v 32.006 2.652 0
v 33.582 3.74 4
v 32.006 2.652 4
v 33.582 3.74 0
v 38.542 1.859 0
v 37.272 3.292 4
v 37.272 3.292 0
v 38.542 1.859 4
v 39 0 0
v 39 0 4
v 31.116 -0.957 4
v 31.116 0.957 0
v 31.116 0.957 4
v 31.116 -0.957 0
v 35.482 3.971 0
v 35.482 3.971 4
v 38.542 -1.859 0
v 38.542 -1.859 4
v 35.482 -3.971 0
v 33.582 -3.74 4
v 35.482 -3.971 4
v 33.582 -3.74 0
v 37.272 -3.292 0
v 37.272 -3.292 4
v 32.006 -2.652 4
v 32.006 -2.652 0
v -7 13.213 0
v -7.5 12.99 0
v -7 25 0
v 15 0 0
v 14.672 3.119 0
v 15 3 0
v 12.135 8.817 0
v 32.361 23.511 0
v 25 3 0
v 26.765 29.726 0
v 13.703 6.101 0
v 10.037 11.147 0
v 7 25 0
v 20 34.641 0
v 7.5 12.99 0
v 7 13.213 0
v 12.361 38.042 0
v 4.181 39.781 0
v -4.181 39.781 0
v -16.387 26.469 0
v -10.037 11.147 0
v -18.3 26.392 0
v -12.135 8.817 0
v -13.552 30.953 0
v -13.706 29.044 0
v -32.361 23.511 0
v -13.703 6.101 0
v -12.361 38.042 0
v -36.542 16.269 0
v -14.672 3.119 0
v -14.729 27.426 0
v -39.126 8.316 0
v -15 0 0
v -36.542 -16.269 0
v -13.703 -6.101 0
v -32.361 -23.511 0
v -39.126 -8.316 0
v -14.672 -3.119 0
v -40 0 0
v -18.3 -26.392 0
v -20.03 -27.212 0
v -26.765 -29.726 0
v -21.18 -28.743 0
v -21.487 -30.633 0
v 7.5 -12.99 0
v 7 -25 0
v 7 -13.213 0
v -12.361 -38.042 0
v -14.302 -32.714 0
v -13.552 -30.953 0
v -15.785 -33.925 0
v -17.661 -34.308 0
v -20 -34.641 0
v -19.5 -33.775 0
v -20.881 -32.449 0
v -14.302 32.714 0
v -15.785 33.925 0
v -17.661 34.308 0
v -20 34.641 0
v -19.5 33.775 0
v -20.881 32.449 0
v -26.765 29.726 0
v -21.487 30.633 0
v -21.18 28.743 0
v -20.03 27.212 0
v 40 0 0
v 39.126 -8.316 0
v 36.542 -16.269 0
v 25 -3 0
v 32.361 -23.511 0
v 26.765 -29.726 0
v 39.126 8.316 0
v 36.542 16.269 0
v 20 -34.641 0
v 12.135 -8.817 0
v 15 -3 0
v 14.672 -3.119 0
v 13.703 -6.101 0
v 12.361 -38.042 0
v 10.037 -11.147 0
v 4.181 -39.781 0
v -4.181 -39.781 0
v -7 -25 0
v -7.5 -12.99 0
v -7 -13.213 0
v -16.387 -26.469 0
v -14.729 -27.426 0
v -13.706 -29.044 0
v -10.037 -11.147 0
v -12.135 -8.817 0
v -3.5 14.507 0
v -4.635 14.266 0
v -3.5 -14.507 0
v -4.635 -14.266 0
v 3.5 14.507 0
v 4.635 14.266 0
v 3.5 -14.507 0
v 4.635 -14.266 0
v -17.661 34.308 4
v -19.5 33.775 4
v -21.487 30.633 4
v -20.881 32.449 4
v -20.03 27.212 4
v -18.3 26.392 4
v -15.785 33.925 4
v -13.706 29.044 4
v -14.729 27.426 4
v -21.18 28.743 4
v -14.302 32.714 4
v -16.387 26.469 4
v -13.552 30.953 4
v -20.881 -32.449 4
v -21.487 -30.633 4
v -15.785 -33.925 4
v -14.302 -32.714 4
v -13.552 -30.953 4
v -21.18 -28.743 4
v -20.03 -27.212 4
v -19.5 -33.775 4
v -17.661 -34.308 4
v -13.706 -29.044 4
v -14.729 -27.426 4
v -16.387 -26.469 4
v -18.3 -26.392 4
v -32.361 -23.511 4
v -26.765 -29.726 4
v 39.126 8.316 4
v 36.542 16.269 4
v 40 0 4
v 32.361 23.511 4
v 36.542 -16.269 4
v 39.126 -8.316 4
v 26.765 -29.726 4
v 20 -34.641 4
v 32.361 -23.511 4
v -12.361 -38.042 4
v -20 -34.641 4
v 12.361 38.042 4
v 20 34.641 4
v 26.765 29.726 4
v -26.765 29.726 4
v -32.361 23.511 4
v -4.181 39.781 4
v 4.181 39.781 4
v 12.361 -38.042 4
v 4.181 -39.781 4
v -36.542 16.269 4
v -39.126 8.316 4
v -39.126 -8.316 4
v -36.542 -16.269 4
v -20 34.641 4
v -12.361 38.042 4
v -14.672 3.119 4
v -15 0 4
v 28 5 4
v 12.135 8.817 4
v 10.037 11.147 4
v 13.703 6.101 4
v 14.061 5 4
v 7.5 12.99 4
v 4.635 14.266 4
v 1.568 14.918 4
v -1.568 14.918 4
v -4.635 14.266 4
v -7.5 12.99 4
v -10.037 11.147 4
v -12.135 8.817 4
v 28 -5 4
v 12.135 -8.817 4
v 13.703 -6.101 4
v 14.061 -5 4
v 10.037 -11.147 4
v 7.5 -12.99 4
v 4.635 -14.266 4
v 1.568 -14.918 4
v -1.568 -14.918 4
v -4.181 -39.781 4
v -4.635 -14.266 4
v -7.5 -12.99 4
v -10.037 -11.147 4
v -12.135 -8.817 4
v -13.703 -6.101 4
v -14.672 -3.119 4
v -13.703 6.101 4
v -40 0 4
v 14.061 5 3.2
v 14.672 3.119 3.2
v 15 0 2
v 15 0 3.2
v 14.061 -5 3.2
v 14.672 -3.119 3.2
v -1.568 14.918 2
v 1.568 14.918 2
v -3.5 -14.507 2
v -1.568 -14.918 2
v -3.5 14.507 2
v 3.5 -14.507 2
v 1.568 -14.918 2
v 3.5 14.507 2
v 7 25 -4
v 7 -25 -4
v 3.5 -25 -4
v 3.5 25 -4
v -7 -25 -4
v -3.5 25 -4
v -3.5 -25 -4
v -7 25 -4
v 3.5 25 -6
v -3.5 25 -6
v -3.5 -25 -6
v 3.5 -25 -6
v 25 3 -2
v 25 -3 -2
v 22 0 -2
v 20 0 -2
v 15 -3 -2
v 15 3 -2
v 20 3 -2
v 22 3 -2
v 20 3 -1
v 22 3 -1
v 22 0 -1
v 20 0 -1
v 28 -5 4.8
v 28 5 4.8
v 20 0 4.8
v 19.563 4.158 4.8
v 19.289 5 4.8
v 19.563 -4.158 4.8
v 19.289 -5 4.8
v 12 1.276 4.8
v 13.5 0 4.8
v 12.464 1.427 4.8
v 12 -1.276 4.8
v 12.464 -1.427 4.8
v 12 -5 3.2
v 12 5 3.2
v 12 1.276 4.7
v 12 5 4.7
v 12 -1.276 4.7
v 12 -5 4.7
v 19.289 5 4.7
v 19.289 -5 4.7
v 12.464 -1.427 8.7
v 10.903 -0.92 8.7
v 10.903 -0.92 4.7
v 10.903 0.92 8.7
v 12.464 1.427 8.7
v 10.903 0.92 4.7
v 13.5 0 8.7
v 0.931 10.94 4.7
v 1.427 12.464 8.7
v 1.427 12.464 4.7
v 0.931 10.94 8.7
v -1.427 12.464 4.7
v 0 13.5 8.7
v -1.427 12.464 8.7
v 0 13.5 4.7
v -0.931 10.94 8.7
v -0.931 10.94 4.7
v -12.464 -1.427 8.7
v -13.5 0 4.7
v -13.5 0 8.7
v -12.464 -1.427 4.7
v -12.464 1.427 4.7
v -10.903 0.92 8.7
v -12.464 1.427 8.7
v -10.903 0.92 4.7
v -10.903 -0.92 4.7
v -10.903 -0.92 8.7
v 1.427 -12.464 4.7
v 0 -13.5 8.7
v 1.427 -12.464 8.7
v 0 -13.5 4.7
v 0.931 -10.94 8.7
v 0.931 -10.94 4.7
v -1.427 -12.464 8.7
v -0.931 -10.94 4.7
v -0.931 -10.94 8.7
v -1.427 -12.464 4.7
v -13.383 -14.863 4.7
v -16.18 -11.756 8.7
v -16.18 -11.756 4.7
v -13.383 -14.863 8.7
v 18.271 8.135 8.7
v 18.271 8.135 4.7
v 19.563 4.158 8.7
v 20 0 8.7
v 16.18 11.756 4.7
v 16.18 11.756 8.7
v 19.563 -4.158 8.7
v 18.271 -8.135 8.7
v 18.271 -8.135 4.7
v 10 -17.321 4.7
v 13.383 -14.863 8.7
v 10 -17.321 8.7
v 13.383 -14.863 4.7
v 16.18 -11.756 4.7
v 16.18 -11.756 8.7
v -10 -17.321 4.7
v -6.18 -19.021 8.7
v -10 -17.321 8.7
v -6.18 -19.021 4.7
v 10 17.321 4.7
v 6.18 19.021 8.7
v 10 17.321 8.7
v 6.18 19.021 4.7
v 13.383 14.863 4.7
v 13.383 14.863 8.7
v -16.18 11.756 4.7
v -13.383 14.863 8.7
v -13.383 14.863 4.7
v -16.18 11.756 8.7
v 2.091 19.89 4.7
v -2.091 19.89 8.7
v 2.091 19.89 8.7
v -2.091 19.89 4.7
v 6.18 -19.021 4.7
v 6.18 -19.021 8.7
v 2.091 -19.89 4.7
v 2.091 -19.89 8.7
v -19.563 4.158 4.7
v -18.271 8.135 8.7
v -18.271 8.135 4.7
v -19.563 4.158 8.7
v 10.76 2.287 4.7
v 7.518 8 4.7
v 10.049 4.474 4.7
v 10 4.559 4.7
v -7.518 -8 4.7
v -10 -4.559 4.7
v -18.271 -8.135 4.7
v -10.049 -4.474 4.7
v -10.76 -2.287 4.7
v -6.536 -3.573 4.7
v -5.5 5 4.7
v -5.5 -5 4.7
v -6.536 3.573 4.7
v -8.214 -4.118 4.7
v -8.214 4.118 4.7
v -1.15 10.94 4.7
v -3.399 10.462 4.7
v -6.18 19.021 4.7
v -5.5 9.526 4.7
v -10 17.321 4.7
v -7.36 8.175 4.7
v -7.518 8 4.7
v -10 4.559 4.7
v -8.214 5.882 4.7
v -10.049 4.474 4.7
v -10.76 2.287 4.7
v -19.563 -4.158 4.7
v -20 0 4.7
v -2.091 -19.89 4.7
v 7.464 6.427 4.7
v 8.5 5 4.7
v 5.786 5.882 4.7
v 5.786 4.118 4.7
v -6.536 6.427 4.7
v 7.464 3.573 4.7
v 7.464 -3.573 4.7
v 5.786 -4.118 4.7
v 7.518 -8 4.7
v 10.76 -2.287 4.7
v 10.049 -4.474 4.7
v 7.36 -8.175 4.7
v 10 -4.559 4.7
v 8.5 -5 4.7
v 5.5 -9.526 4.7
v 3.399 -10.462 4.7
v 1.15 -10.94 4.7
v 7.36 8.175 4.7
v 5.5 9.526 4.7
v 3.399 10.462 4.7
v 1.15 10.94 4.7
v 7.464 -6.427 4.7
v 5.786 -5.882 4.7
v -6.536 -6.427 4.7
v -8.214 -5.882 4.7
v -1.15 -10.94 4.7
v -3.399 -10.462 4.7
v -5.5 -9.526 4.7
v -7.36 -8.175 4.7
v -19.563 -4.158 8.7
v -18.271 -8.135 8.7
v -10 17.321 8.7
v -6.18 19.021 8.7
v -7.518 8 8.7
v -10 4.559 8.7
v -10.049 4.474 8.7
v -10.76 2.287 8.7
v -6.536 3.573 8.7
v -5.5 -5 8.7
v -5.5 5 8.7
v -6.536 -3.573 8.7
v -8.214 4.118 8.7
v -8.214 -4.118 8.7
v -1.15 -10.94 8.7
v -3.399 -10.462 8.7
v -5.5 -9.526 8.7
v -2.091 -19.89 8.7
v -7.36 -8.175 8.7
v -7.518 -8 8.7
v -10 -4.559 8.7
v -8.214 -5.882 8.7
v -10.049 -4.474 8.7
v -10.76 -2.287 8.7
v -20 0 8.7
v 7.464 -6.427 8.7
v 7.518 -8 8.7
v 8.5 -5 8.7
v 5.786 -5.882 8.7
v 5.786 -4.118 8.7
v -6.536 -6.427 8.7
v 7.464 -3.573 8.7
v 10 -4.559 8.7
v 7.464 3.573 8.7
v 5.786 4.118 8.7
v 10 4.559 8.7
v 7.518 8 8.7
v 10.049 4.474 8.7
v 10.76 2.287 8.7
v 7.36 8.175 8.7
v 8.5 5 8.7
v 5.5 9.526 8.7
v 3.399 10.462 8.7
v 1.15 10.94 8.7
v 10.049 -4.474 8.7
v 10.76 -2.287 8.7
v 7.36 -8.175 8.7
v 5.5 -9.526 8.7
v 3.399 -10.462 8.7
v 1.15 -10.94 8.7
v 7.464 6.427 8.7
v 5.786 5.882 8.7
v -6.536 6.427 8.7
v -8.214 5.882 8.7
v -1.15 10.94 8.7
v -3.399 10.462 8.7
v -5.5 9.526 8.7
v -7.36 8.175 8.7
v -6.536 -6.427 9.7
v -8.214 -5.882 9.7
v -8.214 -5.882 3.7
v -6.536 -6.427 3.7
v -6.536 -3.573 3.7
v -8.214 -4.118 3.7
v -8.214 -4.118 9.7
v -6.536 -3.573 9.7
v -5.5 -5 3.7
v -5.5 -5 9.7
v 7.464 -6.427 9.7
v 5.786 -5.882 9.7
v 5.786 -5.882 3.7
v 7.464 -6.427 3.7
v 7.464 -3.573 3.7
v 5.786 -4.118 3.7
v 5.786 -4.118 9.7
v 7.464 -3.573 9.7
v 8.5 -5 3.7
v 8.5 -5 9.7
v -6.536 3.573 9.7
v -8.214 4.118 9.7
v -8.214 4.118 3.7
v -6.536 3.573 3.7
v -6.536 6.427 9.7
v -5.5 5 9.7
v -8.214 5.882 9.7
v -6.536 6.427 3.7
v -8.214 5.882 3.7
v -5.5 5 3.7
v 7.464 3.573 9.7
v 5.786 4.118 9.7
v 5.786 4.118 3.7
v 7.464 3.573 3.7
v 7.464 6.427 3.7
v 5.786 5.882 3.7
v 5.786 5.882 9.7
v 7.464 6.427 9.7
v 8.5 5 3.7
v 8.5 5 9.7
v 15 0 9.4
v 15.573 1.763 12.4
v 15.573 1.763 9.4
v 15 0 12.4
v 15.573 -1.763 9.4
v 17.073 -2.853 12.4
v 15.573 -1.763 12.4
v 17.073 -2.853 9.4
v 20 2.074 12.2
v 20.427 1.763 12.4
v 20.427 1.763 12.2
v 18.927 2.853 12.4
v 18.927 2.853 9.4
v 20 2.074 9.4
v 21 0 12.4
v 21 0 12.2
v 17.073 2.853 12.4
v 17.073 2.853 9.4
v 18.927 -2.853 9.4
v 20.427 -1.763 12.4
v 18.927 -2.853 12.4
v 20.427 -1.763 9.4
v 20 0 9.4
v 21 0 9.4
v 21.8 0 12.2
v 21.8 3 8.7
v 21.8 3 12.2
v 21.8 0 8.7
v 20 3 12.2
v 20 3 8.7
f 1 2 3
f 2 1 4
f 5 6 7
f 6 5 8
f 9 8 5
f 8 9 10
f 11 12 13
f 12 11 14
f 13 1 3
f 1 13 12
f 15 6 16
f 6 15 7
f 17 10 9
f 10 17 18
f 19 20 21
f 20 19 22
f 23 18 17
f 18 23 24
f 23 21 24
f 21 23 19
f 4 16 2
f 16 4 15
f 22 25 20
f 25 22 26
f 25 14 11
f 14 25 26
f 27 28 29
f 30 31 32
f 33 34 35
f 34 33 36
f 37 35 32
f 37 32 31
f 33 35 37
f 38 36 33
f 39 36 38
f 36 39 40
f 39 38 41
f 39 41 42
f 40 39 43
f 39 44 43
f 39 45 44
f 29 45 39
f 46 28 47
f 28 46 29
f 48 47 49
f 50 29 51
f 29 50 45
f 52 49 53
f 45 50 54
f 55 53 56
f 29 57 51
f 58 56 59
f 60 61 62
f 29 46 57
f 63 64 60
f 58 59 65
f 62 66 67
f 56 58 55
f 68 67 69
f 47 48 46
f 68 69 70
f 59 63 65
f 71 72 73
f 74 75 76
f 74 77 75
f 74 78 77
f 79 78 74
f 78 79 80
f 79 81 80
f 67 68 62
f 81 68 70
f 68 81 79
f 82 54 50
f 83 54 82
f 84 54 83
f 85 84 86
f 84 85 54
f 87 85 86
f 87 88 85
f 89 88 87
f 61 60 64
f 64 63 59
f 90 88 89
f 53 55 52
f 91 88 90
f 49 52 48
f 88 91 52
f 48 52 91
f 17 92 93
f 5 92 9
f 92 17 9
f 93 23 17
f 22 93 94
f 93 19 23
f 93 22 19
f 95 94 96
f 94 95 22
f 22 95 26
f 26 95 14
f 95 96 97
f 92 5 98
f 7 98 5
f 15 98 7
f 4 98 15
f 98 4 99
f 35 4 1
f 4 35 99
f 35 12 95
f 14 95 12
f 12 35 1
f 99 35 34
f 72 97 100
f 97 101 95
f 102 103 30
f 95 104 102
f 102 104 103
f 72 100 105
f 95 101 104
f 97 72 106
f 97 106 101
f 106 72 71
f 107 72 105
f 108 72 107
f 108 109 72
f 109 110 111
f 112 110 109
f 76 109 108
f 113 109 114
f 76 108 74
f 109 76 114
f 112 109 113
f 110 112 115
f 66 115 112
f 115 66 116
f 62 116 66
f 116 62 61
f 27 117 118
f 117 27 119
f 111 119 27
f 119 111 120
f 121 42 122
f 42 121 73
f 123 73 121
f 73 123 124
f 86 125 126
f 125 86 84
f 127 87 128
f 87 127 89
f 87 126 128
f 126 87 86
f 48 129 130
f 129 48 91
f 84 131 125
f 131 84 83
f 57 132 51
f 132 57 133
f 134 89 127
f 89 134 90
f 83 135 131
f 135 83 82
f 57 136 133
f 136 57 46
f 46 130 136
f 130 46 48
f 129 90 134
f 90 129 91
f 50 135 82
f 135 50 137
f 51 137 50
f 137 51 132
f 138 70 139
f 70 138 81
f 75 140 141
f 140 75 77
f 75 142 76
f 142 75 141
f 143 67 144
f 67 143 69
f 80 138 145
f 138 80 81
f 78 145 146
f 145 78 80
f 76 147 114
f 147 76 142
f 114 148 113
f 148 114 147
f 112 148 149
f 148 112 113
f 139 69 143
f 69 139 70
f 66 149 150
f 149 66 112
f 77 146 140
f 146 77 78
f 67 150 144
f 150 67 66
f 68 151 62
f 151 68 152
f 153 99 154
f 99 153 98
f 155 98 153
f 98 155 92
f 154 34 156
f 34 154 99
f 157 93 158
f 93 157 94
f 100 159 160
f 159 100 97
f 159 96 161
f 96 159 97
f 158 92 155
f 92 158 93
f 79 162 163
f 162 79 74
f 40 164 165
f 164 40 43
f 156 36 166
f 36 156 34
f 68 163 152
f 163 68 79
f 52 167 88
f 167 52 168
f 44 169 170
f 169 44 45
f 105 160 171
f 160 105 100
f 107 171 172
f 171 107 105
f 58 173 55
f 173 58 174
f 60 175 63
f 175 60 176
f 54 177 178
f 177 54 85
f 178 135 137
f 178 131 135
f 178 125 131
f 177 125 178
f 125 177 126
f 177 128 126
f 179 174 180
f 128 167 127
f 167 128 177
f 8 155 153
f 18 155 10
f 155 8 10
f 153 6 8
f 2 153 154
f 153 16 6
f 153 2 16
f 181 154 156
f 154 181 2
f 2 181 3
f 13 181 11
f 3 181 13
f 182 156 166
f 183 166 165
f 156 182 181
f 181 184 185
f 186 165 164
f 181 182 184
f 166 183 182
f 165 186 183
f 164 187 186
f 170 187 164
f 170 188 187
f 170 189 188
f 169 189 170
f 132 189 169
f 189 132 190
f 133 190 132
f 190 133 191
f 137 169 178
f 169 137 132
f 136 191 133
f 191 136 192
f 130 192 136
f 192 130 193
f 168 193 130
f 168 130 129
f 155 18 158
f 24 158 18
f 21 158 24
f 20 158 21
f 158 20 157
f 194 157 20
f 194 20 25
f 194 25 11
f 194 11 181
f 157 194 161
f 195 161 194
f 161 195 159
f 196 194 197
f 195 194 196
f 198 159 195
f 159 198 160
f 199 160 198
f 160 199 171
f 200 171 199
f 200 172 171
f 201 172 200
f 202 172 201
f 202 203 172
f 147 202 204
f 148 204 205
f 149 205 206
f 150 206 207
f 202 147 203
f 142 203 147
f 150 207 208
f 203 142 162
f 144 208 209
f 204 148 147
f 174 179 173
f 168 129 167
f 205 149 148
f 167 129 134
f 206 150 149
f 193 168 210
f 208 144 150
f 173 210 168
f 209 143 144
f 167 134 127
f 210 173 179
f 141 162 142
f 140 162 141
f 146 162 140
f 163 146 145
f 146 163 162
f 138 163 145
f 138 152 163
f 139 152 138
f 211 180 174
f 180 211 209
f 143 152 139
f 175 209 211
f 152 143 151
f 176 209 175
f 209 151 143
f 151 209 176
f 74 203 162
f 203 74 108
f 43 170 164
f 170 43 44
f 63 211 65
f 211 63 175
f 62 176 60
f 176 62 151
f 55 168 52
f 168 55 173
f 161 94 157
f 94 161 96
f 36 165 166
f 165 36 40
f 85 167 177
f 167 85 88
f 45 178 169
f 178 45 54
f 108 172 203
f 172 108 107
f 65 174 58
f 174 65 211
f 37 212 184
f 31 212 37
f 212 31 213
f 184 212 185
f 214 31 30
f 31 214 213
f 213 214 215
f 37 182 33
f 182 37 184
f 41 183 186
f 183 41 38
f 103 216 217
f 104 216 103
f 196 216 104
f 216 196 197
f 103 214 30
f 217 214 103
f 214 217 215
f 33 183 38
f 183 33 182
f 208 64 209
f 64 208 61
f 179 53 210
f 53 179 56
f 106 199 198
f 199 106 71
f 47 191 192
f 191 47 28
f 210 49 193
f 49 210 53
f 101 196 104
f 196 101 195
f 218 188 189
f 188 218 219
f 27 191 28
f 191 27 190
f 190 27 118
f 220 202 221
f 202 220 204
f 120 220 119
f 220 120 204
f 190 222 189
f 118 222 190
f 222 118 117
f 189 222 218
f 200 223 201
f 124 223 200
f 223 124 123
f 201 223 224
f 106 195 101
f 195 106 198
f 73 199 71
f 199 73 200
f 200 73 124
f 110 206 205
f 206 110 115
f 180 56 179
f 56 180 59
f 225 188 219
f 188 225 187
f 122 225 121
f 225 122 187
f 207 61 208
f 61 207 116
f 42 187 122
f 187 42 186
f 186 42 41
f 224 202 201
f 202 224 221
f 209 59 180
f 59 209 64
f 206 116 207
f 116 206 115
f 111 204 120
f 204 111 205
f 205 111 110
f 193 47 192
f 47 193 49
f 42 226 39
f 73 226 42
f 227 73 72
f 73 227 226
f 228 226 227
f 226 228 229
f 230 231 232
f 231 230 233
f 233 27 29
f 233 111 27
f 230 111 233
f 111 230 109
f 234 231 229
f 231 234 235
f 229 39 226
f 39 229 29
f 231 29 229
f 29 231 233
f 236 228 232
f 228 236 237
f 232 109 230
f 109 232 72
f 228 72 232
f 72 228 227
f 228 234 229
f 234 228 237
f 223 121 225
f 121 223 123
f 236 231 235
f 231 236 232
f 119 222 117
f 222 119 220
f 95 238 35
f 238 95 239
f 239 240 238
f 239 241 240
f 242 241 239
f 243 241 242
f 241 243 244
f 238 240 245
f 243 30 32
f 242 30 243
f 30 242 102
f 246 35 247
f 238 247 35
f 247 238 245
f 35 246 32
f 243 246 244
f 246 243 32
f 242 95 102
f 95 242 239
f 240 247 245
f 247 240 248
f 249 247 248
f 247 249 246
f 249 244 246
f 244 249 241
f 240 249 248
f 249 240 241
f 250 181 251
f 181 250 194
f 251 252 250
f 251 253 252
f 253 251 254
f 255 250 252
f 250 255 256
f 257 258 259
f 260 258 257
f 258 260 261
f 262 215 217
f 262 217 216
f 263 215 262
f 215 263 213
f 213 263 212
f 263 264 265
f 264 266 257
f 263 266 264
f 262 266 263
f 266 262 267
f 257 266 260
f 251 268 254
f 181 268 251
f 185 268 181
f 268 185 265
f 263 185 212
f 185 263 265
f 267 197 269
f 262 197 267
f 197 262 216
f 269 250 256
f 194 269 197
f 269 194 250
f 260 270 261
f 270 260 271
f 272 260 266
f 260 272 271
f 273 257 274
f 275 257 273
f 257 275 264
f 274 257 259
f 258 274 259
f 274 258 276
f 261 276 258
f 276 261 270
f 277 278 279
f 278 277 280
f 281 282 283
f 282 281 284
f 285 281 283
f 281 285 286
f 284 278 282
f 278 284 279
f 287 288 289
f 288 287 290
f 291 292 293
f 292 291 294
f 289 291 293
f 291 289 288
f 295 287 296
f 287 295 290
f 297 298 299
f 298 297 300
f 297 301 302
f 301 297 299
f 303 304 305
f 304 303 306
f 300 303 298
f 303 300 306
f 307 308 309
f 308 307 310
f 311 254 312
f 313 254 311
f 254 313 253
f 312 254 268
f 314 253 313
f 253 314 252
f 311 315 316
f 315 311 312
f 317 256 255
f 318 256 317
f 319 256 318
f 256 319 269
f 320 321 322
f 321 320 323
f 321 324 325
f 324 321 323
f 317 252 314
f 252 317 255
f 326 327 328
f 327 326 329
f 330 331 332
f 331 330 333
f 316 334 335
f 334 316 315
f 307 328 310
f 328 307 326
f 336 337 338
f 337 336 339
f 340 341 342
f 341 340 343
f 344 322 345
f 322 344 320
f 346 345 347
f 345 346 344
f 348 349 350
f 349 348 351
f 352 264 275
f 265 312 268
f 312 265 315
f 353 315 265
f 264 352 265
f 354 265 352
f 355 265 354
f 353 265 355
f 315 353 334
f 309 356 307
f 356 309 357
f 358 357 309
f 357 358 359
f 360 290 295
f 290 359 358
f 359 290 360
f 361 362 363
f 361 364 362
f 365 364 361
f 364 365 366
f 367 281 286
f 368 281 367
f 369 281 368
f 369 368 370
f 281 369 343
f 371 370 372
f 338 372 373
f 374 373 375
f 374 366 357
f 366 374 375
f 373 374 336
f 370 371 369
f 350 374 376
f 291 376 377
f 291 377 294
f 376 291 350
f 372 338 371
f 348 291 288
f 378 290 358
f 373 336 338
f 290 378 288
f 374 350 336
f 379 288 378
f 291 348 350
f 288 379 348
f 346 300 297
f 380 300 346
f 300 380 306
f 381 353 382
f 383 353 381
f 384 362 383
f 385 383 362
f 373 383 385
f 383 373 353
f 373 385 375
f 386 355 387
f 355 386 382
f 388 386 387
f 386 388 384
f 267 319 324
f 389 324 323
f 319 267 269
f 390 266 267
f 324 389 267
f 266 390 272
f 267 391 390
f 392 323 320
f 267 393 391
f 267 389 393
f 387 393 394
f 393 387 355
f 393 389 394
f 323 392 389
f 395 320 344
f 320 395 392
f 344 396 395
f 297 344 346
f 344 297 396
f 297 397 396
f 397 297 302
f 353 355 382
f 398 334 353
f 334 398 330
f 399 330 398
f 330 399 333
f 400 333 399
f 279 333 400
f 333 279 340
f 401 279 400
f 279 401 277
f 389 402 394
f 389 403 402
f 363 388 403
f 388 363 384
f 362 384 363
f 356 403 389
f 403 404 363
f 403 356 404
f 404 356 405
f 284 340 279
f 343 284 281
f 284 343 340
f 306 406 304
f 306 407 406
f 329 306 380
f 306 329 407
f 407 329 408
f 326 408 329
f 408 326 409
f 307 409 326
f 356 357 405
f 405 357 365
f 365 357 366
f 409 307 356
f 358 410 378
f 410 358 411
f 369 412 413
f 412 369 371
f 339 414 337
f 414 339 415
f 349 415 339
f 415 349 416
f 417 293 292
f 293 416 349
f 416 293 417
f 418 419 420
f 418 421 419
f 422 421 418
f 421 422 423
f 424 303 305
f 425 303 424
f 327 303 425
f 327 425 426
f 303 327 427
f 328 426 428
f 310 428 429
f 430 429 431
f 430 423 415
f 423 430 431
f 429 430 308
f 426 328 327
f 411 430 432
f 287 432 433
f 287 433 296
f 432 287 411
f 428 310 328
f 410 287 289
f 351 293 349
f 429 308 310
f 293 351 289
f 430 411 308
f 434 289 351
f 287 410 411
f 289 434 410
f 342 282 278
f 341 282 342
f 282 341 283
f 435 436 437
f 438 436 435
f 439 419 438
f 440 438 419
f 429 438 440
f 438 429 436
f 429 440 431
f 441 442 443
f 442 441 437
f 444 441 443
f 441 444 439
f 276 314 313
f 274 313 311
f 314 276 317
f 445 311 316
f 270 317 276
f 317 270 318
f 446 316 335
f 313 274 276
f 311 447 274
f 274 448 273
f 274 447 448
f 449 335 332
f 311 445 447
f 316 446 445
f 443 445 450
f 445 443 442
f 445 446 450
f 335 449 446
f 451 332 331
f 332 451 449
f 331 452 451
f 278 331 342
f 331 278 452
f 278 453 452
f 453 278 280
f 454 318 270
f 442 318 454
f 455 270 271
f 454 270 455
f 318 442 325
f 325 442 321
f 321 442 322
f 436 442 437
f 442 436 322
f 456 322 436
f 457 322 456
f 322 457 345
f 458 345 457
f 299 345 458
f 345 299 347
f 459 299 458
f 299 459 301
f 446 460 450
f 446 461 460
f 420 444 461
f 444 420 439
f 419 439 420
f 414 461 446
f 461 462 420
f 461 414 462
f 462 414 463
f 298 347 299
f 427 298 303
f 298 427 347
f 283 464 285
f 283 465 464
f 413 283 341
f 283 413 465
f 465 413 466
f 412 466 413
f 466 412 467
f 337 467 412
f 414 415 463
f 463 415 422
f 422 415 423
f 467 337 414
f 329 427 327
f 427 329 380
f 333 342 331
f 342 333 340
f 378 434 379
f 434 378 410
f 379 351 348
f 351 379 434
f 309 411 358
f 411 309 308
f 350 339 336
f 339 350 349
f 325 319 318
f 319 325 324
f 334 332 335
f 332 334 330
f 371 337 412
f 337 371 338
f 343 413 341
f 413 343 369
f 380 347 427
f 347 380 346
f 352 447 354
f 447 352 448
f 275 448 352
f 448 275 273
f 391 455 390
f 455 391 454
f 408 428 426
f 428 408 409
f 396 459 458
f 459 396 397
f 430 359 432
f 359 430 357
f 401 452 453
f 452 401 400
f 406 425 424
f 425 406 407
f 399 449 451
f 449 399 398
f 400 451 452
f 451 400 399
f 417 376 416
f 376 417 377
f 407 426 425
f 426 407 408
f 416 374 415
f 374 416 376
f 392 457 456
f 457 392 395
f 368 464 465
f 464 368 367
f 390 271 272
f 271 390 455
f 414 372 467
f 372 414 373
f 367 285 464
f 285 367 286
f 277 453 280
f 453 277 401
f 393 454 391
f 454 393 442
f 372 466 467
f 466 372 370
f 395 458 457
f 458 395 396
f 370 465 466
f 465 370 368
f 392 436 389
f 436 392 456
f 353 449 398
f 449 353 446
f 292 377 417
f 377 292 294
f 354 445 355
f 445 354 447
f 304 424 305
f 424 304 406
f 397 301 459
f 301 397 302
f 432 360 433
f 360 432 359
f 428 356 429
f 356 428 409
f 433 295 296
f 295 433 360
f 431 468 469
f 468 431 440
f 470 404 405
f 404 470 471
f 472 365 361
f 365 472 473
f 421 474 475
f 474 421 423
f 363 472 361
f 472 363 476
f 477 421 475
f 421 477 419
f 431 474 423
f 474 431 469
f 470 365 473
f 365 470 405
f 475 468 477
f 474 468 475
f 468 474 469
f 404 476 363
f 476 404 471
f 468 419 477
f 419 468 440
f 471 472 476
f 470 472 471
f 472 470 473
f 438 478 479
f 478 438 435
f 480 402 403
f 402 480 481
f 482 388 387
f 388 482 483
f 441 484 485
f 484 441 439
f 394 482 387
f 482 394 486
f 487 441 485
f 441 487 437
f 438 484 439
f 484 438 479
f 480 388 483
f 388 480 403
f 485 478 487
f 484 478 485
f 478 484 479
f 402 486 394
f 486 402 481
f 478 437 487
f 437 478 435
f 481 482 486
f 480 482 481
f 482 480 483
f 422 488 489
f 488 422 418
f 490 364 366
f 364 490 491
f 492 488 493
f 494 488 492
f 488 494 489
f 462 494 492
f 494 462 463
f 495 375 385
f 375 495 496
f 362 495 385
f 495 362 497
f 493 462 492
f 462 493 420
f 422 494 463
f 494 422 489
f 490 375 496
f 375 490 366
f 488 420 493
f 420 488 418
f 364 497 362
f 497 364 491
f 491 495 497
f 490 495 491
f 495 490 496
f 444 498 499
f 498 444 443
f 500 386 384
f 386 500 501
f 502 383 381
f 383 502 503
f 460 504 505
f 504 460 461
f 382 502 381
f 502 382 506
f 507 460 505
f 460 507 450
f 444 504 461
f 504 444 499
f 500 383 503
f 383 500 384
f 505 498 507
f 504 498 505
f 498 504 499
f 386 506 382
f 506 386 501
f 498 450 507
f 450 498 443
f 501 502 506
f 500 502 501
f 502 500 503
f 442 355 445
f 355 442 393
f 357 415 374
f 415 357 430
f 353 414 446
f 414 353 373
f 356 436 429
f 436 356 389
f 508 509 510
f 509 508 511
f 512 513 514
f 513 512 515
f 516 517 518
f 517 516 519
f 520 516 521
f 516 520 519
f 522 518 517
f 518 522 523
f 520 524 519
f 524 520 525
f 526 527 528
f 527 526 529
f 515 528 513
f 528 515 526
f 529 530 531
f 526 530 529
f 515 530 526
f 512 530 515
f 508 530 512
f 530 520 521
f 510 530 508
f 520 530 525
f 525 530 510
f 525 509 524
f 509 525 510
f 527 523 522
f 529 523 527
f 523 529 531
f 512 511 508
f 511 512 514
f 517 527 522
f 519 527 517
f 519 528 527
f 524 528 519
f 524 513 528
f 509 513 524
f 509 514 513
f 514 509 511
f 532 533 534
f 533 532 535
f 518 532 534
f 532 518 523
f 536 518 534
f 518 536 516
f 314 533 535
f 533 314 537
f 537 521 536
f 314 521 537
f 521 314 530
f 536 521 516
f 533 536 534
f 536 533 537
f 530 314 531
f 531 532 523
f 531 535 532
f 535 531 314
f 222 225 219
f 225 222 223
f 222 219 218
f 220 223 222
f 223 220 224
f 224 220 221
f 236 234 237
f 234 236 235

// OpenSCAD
// ===== Global parameters =====
effector_d      = 80;      // effector outer diameter
arm_pitch_deg   = 120;     // 3 arms at 120°
arm_radius      = 35;      // distance from center to arm joint centers

// Rail parameters (MGN7)
rail_len        = 50;      // MGN7 rail length (short)
rail_offset_z   = -10;     // rail mounting Z relative to effector top
rail_pitch      = 7;       // MGN7 rail width nominal
rail_hole_pitch = 15;      // hole spacing along rail (approx / adjust to real)
rail_mount_th   = 4;       // thickness of plastic under rail

// Hotend parameters
hotend_offset_z = -30;     // nozzle tip below effector plane
hotend_mount_radius = 12;  // radius of screw circle for V6/Rapido clamp
nozzle_xy_offset = [0,0];  // keep nozzle at effector center

// Tap-like motion
probe_travel    = 1.5;     // total Z travel of floating hotend
probe_force_g   = 250;     // target probe force (grams), for spring/magnet sizing

// Magnets
//mag_d           = 6;       // magnet diameter
//mag_h           = 3;       // magnet thickness
//mag_radius      = 18;      // radial distance of magnets from center

// Optical sensor (Voron Tap style)
opt_slot_width  = 2.0;     // beam slot width
opt_slot_height = 8.0;     // vertical opening
opt_offset_r    = 20;      // radial position of sensor
opt_offset_z    = -5;      // Z position of sensor slot center

// Effector thicknesses
effector_th     = 4;       // main plate thickness
boss_th         = 4;       // extra boss thickness for mounting features
module effector_plate() {
    difference() {
        // main disc
        cylinder(h = effector_th, d = effector_d, center = false);

        // arm joint cutouts (placeholder)
        for (i = [0:2]) {
            rotate([0,0,i*arm_pitch_deg])
                translate([arm_radius,0,0])
                    cylinder(h = effector_th+0.1, d = 8, center = false);
        }

        // central clearance for hotend
        translate([0,0,-0.1])
            cylinder(h = effector_th+0.2, d = 30, center = false);
    }
}

// Rail mounting bosses (underside)
module rail_mount() {
    // Mount rail along +Y axis (you can rotate as needed)
    translate([0,0, -rail_mount_th])
    difference() {
        // rectangular boss under rail
        translate([-rail_pitch, -rail_len/2, 0])
            cube([2*rail_pitch, rail_len, rail_mount_th], center=false);

        // clearance for rail body (optional)
        translate([-rail_pitch/2, -rail_len/2, -0.1])
            cube([rail_pitch, rail_len, rail_mount_th+0.2], center=false);

        // screw holes along rail
        for (y = [-rail_len/2 + rail_hole_pitch/2 : rail_hole_pitch : rail_len/2 - rail_hole_pitch/2]) {
            translate([0, y, -1])
                cylinder(h = rail_mount_th+2, d = 3, center=false);
        }
    }
}

/*
// Magnet pockets on effector (fixed side)
module fixed_magnets() {
    for (angle = [0, 120, 240]) {
        rotate([0,0,angle])
            translate([mag_radius,0,effector_th - mag_h])
                cylinder(h = mag_h, d = mag_d, center=false);
    }
}
*/

// Sensor PCB placeholder + slot
module sensor_mount() {
    // simple block representing PCB
    translate([opt_offset_r, 0, effector_th])
        cube([16, 10, 1.6], center=true);

    // optical slot cut in front of PCB
    difference() {
        // support boss
        translate([opt_offset_r, 0, 0])
            cube([10, 6, effector_th], center=true);

        // slot for flag
        translate([opt_offset_r, 0, opt_offset_z - opt_slot_height/2])
            cube([opt_slot_width, 4, opt_slot_height], center=false);
    }
}

// Combine effector components
module effector_assembly() {
    union() {
        effector_plate();
        rail_mount();
        sensor_mount();
        // Magnet pockets would be cut or unioned depending on your approach
    }
}
// Placeholder for MGN7 carriage mount
module mgn7_carriage_mount() {
    // simple block to bolt carriage to moving plate
    // adjust hole spacing to your actual carriage
    translate([-10, -8, 0])
        cube([20, 16, 4], center=false);
    // carriage holes (example)
    for (p = [[-7, -5], [7, -5], [-7,5], [7,5]]) {
        translate([p[0], p[1], -1])
            cylinder(h = 6, d = 3, center=false);
    }
}

// Moving plate around hotend
module hotend_carrier_plate() {
    difference() {
        // circular plate
        cylinder(h = 4, d = 40, center=false);

        // hotend central clearance
        translate([0,0,-0.1])
            cylinder(h = 4.2, d = 22, center=false);

        // V6/Rapido bolt circle (M3)
        for (angle = [0:90:270]) {
            rotate([0,0,angle])
                translate([hotend_mount_radius,0,-1])
                    cylinder(h = 6, d = 3, center=false);
        }
    }
}

// Moving magnets
module moving_magnets() {
    for (angle = [0, 120, 240]) {
        rotate([0,0,angle])
            translate([mag_radius,0,4])  // top side of moving plate
                cylinder(h = mag_h, d = mag_d, center=false);
    }
}

// Optical flag
module optical_flag() {
    // Flag rises up from moving plate into sensor slot when probed
    translate([opt_offset_r, 0, 4])  // base on moving plate top
        cube([opt_slot_width - 0.2, 3, probe_travel + 2], center=false);
}

/*
// Combine moving parts
module moving_hotend_assembly() {
    union() {
        translate([0,0,effector_th + probe_travel]) {
            hotend_carrier_plate();
            mgn7_carriage_mount();
            moving_magnets();
            optical_flag();
        }
    }
}
*/

//spring_radius = 18;
//spring_d      = 5;
//spring_h      = 8;
//
//module spring_pockets_fixed() {
//    for (angle = [0,120,240]) {
//        rotate([0,0,angle])
//            translate([spring_radius,0,effector_th - spring_h])
//                cylinder(h = spring_h, d = spring_d, center=false);
//    }
//}
//
//module spring_pockets_moving() {
//    for (angle = [0,120,240]) {
//        rotate([0,0,angle])
//            translate([spring_radius,0,4])  // top of moving plate
//                cylinder(h = spring_h, d = spring_d, center=false);
//    }
//}

// Assume the parameter and module definitions from before are present:
// - effector_assembly()
// - moving_hotend_assembly()
// - (plus any helper modules)

/*
module assembly(rest_position = true) {
    // Fixed effector at Z = 0
    effector_assembly();

    // Rail visual (simple block)
    // Or you can model it properly if you like
    translate([-rail_pitch/2, -rail_len/2, effector_th + rail_offset_z])
        color("silver")
        cube([rail_pitch, rail_len, 8], center=false);

    // Moving hotend carrier:
    // at rest: nozzle at nominal Z
    // probed: carrier pushed up by probe_travel
    z_shift = rest_position ? 0 : -probe_travel;

    translate([0,0, z_shift])
        moving_hotend_assembly();
}

// Quick views
assembly(true);   // show at rest
//assembly(false); // uncomment to see probed position
*/

/*
mag_d       = 10;   // your magnets
mag_h       = 2.6;
mag_radius  = 18;
mag_count   = 2;    // start with 1–2 pairs, not 3

module fixed_magnets() {
    for (i = [0:mag_count-1]) {
        angle = i * 360 / mag_count;
        rotate([0,0,angle])
            translate([mag_radius,0,effector_th - mag_h])
                cylinder(h = mag_h, d = mag_d, center=false);
    }
}

module moving_magnets() {
    for (i = [0:mag_count-1]) {
        angle = i * 360 / mag_count;
        rotate([0,0,angle])
            translate([mag_radius,0,4])   // top of moving plate
                cylinder(h = mag_h, d = mag_d, center=false);
    }
}
*/

// Magnet parameters
mag_d        = 6;      // recommended new magnets: 6 mm
mag_h        = 3;      // thickness
mag_pairs    = 3;      // three pairs for symmetry
mag_radius   = 18;     // radial position
mag_rest_gap = 0.7;    // air gap at rest between faces (mm)

// Effector magnet pockets (fixed)
module fixed_magnets() {
    for (i = [0:mag_pairs-1]) {
        angle = i * 360 / mag_pairs;
        rotate([0,0,angle])
            translate([mag_radius, 0, effector_th - mag_h])
                cylinder(h = mag_h, d = mag_d, center=false);
    }
}

// Moving magnet pockets (moving plate)
module moving_magnets() {
    for (i = [0:mag_pairs-1]) {
        angle = i * 360 / mag_pairs;
        // Faces are separated by mag_rest_gap at rest:
        translate([mag_radius, 0, effector_th + mag_rest_gap])
            cylinder(h = mag_h, d = mag_d, center=false);
    }
}

// Update moving assembly to include magnets
module moving_hotend_assembly() {
    union() {
        translate([0,0, effector_th + mag_rest_gap]) {
            hotend_carrier_plate();
            mgn7_carriage_mount();
            moving_magnets();
            #optical_flag();
        }
        // nozzle/hotend model omitted for clarity
    }
}

// Top-level assembly: rest vs probed
module assembly(rest_position = true) {
    effector_assembly();

    // visual rail approximation
    translate([-rail_pitch/2, -rail_len/2, effector_th + rail_offset_z])
        color("silver")
        cube([rail_pitch, rail_len, 8], center=false);

    z_shift = rest_position ? 0 : -probe_travel;
    translate([0,0,z_shift])
        moving_hotend_assembly();
}

// Render
if ($t < 0.5)
    assembly(true);    // at rest
else
    assembly(false); // probed
